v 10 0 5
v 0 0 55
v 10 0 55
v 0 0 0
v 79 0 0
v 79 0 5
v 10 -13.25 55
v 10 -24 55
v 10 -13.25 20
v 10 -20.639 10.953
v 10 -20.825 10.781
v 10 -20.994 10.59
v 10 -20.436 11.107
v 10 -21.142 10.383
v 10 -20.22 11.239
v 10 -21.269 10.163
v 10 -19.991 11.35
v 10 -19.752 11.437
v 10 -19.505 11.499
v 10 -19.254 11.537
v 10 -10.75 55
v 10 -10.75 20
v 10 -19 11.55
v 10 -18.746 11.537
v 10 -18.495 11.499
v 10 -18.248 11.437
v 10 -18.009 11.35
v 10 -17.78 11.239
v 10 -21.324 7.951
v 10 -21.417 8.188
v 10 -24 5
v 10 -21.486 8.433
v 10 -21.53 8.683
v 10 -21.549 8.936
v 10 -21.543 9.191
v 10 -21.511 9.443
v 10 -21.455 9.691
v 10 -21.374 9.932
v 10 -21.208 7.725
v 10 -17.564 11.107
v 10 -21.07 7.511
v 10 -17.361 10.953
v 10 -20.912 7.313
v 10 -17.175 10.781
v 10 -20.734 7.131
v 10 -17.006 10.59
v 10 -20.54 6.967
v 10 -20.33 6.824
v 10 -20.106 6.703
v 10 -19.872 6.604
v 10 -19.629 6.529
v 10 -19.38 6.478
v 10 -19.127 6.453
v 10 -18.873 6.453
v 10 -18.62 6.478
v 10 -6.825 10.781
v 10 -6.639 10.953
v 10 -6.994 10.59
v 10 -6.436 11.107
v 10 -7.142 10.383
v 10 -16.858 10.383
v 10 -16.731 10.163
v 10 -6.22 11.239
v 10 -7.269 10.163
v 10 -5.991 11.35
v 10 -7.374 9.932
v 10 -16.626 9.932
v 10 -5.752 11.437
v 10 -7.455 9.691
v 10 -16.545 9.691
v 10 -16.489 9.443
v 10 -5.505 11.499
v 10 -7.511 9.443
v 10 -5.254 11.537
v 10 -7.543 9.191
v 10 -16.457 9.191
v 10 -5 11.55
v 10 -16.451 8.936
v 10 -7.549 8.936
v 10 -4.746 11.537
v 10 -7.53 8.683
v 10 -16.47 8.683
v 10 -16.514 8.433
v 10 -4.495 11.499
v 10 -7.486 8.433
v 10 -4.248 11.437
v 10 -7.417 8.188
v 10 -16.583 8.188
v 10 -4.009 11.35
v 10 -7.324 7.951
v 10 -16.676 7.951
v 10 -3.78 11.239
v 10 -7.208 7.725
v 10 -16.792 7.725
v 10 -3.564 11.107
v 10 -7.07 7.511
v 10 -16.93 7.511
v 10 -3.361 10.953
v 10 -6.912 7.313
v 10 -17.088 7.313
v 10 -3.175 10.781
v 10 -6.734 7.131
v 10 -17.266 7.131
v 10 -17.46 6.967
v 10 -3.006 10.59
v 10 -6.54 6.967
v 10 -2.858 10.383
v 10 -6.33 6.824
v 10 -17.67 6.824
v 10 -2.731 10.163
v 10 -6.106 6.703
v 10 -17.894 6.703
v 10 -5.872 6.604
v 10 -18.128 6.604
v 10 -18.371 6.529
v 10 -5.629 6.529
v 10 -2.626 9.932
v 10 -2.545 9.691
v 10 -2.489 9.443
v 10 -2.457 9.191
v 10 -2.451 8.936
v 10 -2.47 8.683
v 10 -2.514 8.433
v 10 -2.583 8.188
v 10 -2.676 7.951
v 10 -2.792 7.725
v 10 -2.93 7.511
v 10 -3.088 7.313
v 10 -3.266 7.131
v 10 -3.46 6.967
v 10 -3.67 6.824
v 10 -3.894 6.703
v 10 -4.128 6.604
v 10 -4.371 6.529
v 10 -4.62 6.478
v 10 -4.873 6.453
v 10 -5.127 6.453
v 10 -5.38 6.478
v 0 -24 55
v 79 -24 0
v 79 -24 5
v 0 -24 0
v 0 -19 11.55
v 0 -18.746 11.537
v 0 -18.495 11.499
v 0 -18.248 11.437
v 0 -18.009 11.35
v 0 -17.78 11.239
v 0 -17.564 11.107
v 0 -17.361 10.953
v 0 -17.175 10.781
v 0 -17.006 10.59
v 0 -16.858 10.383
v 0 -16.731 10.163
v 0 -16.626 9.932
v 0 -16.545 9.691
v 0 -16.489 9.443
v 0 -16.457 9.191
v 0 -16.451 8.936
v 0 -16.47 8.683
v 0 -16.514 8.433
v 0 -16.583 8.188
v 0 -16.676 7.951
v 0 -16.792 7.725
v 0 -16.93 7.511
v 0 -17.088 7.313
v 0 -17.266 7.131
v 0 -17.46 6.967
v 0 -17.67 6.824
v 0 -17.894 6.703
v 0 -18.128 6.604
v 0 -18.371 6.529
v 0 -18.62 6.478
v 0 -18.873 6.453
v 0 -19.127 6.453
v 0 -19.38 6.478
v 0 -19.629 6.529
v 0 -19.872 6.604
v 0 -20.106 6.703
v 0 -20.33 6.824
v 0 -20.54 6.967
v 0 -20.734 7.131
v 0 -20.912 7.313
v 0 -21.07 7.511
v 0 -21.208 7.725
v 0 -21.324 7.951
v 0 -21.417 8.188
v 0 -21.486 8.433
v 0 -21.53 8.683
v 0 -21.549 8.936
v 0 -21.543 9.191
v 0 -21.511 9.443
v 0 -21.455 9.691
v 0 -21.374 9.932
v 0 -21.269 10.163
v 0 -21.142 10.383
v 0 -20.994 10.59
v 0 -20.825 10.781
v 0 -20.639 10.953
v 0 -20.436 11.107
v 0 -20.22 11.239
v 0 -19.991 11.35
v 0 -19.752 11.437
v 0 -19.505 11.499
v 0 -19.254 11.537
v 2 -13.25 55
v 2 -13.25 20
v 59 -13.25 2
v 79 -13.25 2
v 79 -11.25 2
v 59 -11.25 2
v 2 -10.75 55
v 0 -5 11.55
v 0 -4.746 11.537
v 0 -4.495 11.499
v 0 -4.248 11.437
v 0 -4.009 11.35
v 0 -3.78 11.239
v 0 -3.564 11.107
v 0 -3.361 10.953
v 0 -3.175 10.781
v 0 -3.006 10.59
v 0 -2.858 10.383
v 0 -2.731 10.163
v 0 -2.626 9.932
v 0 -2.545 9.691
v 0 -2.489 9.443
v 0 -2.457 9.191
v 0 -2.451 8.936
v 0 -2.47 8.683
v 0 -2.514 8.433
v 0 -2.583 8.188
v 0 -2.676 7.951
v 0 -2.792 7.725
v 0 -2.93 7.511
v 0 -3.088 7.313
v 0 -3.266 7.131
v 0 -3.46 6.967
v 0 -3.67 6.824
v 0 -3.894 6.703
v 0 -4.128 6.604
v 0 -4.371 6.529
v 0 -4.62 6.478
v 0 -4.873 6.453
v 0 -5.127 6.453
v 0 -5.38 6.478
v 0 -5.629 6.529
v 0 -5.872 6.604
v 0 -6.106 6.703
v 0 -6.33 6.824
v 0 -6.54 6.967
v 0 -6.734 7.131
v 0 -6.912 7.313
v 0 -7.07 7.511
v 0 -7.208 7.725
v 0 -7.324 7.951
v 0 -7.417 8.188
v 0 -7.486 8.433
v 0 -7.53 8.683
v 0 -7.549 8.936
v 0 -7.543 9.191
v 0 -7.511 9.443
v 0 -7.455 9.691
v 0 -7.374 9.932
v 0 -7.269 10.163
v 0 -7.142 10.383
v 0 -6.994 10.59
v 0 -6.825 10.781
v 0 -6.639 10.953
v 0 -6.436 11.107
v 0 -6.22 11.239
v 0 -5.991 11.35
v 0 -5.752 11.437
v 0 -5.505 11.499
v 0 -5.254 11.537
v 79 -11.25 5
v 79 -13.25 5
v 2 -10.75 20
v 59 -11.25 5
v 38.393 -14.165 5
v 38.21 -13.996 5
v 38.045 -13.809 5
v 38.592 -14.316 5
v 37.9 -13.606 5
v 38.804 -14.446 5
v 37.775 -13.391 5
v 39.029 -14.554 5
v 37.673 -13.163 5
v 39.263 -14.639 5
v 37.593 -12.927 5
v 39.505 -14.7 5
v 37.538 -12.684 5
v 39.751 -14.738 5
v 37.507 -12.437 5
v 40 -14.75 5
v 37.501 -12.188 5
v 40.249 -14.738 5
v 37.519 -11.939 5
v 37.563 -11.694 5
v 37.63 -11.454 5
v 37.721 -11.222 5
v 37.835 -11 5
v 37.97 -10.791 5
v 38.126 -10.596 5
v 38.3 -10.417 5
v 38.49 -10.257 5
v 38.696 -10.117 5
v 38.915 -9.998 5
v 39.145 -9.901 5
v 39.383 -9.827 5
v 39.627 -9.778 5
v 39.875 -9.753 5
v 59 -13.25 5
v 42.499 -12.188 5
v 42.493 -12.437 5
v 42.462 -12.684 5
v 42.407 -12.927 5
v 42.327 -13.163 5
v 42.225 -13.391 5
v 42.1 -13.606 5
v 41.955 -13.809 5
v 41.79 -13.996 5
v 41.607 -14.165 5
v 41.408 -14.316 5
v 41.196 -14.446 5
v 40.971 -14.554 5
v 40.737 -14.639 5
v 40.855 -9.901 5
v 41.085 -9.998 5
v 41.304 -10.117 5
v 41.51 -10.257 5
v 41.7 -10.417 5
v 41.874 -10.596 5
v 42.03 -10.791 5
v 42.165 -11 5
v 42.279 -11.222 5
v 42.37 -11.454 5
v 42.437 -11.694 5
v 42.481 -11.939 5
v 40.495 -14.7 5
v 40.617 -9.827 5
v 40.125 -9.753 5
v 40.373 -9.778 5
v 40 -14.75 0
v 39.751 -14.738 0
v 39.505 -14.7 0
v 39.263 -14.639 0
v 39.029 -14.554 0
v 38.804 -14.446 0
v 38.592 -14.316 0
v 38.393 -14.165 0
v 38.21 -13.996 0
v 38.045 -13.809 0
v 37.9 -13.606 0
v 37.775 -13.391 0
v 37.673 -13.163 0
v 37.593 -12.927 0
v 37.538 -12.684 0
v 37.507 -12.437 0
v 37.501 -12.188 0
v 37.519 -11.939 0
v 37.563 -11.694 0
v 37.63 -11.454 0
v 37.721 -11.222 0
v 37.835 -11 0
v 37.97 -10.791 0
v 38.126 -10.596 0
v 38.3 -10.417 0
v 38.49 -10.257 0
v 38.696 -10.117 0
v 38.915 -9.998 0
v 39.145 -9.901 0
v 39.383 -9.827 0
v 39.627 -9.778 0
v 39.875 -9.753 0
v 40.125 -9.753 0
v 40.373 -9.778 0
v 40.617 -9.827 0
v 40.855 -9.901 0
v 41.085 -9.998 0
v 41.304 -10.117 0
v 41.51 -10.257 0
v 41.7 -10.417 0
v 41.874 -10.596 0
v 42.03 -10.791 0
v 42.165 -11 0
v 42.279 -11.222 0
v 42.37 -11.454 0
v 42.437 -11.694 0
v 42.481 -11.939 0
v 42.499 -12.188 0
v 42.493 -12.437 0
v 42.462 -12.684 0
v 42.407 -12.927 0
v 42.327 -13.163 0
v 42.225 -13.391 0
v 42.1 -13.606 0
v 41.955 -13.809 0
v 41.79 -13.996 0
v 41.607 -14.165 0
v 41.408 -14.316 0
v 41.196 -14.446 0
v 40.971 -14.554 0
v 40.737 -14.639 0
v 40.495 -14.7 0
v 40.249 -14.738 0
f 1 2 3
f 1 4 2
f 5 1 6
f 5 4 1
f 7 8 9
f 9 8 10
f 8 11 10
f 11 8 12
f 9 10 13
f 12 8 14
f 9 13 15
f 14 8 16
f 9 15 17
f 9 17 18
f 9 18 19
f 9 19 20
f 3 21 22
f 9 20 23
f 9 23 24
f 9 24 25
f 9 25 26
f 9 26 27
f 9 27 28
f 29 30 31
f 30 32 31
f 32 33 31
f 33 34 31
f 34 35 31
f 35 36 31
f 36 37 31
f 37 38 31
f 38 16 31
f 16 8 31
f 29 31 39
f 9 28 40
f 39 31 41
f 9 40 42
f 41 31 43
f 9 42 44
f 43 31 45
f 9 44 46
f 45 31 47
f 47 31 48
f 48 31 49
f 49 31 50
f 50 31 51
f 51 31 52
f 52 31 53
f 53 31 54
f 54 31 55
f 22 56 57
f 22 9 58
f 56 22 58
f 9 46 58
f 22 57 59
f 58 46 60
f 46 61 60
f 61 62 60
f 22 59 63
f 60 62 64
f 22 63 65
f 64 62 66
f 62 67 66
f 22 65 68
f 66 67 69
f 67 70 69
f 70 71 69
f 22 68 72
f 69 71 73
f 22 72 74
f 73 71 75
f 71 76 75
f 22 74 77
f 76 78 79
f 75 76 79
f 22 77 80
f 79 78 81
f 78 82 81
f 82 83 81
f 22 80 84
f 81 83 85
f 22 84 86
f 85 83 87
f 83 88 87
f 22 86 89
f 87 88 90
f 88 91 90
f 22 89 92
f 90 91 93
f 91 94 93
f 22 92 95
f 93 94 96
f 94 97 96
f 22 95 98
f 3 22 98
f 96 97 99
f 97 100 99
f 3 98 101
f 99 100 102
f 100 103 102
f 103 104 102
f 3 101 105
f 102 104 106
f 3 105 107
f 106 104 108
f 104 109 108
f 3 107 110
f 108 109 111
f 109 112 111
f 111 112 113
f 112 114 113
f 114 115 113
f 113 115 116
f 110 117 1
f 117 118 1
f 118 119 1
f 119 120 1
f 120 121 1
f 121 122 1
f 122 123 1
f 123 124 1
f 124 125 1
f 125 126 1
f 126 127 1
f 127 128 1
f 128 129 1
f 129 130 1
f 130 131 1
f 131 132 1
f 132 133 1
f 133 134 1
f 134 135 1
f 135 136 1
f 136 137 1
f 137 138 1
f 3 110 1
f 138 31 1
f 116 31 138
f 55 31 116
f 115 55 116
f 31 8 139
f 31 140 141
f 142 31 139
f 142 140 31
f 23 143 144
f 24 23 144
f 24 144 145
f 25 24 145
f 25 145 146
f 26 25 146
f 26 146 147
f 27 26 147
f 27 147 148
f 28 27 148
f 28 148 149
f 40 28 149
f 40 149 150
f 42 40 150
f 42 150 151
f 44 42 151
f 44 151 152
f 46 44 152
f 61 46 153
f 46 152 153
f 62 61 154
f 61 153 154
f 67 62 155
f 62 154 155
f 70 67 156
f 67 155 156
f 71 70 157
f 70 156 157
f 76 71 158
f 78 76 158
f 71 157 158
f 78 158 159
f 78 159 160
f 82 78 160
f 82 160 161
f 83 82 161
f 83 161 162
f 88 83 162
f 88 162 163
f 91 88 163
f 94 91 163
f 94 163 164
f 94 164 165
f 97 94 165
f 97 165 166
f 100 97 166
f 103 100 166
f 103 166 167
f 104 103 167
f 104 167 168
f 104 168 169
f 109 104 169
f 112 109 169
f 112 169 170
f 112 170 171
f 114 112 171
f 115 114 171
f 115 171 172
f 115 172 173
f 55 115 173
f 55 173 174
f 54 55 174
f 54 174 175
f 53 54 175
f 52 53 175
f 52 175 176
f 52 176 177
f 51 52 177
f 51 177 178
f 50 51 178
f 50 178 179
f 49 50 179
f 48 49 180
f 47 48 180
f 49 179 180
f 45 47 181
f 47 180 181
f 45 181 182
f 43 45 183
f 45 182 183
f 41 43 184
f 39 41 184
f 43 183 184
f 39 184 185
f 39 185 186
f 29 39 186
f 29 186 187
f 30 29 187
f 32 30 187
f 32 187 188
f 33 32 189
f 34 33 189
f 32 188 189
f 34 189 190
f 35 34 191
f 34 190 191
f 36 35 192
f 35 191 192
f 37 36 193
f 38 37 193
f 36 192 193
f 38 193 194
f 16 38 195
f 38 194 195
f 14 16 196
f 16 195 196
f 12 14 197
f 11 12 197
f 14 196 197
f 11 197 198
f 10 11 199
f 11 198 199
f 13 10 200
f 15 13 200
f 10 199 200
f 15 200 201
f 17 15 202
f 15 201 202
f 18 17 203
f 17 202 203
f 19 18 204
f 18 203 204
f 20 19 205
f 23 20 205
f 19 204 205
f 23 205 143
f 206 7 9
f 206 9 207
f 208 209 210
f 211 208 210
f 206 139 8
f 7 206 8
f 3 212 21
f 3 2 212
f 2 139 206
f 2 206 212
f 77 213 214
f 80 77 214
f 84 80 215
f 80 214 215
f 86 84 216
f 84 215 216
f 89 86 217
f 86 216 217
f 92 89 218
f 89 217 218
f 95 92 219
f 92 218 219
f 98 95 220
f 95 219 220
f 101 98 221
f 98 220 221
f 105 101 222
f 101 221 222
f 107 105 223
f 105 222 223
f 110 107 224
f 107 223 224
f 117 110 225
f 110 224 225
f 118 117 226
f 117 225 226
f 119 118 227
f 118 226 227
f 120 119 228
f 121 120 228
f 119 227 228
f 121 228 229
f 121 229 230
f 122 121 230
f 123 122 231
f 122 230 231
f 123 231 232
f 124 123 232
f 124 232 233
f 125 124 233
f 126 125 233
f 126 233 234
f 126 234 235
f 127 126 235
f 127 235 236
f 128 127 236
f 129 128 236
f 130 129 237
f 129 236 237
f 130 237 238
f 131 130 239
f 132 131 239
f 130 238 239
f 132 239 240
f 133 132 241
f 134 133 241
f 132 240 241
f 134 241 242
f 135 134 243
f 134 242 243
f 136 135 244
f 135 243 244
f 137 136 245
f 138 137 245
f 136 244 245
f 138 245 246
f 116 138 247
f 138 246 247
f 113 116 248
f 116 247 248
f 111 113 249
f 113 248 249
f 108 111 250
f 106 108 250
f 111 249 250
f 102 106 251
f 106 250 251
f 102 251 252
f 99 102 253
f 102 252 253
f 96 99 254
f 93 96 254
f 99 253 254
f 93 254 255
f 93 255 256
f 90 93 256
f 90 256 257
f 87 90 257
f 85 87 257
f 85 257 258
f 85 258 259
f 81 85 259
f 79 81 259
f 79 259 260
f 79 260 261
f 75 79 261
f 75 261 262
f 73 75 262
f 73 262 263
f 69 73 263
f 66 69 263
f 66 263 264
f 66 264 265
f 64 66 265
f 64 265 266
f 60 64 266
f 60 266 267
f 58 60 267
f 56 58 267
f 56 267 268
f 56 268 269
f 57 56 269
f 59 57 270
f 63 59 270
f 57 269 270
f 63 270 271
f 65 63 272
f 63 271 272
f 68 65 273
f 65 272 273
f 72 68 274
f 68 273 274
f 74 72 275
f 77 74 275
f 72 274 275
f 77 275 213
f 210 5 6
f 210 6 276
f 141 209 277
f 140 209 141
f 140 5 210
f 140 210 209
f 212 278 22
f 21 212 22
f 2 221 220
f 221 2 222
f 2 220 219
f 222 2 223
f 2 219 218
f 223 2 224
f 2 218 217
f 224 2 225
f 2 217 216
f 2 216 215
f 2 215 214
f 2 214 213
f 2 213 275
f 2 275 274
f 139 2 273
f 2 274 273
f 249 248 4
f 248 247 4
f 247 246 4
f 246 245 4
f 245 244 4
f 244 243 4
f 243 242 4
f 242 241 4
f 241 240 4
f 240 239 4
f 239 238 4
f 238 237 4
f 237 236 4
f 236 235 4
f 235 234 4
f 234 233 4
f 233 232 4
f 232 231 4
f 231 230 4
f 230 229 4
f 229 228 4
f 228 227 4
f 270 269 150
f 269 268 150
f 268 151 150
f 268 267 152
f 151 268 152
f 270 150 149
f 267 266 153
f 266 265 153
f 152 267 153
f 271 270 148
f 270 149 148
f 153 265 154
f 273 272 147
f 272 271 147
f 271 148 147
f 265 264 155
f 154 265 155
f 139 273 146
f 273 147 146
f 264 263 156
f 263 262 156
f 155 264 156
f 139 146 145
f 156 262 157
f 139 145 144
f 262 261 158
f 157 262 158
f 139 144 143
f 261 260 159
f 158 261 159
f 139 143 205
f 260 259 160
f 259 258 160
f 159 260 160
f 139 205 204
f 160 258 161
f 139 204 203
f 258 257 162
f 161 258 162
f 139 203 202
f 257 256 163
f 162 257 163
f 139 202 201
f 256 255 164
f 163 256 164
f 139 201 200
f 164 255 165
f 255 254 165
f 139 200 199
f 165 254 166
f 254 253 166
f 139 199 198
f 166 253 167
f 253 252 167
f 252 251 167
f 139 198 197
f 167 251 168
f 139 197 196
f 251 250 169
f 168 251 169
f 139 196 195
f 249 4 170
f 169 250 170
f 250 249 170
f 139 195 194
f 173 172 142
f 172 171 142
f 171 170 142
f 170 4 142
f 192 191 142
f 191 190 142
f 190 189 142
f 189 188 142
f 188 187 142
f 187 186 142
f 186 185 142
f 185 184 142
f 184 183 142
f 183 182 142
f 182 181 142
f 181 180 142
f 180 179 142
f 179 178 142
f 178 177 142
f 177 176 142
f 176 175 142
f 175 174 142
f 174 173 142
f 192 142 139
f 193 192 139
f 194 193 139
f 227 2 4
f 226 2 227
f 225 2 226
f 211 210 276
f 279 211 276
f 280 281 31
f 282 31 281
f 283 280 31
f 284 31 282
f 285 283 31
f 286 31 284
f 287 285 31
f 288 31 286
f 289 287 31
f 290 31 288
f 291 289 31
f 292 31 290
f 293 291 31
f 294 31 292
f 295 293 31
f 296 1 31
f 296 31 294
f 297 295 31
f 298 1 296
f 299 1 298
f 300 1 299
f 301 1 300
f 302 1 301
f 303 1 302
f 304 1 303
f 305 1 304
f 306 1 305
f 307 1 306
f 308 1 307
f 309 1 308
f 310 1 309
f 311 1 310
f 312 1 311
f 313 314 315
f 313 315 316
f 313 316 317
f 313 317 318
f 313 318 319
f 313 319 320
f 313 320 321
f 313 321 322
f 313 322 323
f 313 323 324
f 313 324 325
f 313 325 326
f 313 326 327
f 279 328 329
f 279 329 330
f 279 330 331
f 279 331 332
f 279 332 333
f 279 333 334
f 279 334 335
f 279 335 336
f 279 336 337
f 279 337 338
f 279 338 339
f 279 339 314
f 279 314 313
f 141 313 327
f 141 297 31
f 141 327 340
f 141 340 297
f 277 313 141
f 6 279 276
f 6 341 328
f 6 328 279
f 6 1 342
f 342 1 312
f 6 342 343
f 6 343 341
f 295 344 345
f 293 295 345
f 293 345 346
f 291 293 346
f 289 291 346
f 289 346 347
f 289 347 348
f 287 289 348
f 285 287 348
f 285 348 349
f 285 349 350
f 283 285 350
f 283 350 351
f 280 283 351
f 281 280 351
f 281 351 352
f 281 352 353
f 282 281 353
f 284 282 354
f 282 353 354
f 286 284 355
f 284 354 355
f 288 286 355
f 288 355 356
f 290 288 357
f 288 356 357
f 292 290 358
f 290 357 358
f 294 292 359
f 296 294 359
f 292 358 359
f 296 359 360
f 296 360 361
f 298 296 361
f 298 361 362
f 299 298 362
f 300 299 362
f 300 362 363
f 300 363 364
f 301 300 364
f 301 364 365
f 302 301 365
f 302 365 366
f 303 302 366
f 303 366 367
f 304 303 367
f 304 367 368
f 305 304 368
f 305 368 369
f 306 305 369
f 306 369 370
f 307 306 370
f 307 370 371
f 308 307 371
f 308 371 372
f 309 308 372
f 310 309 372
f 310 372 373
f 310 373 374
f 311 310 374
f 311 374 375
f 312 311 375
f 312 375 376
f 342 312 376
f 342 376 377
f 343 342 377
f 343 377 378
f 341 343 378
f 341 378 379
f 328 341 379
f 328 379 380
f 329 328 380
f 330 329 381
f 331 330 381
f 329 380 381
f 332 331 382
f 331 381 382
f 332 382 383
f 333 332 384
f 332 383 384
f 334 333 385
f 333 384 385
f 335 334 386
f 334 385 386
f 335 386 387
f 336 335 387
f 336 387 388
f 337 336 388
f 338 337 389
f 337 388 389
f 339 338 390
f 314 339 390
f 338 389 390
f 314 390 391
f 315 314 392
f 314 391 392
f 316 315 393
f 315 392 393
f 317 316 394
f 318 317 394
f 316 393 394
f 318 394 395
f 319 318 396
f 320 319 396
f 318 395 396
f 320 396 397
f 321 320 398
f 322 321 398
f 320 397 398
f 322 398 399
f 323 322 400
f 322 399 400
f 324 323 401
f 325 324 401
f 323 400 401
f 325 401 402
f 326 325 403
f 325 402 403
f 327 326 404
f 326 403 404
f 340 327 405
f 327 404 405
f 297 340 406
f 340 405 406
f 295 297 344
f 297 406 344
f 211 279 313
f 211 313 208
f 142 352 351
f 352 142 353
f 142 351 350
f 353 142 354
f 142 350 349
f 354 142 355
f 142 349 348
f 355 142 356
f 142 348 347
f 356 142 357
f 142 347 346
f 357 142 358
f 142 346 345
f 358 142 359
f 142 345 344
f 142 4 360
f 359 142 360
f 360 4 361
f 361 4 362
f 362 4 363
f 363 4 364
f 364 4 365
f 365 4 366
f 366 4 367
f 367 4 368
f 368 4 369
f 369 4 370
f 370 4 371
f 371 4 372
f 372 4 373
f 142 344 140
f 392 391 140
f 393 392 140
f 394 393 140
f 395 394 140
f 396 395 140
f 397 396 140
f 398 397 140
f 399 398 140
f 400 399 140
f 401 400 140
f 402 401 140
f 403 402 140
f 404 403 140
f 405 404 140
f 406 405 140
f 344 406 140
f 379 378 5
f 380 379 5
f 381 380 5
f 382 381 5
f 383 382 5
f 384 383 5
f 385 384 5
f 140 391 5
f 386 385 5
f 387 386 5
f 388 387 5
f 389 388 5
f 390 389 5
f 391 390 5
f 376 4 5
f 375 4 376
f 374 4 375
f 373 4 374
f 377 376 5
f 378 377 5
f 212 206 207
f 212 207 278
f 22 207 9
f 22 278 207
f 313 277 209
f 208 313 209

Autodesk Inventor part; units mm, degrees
sketch "Skizze1" plane through (0, 0, 0) normal (0, 0, 1) x (1, 0, 0)
  line L0 (-15.8, 0) -> (94.8, 0) projected
  line L1 (0, -28.8) -> (0, 4.8) projected
  line L2 (0, 0) -> (79, 0)
  line L3 (79, 0) -> (79, -24)
  line L4 (79, -24) -> (0, -24)
  line L5 (0, -24) -> (0, 0)
  dimension "d0" = 79
  dimension "d1" = 24
extrude "Extrusion1" add sketch "Skizze1" along normal blind 5
sketch "Skizze2" plane through (0, 0, 5) normal (0, 0, 1) x (1, 0, 0)
  line L0 (0, -24) -> (79, -24) projected
  line L1 (0, 0) -> (10, 0)
  line L2 (10, 0) -> (10, -24)
  line L3 (10, -24) -> (0, -24)
  line L4 (0, -24) -> (0, 0)
  dimension "d4" = 10
extrude "Extrusion2" add sketch "Skizze2" along normal blind 35
sketch "Skizze3" plane through (79, -24, 0) normal (1, 0, 0) x (0, 0, -1)
  line L0 (-5, 0) -> (-5, 24) projected
  line L1 (-5, 10.75) -> (-2, 10.75)
  line L2 (-2, 10.75) -> (-2, 12.75)
  line L3 (-2, 12.75) -> (-5, 12.75)
  line L4 (-5, 12.75) -> (-5, 10.75)
  line L5 (0, 24) -> (-5, 24) projected
  dimension "d7" = 3
  dimension "d8" = 2
  dimension "d9" = 11.25
extrude "Extrusion3" cut sketch "Skizze3" against normal blind 20
hole "Bohrung1" at (40, -12.25, 5) direction (0, 0, -1) diameter 5 end through all
sketch "Skizze5" plane through (0, -24, 0) normal (-1, 0, 0) x (0, 0, 1)
  line L0 (5, 24) -> (40, 24) projected
  line L1 (9, 24) -> (9, -0.204)
  line L2 (0, 0) -> (0, 24) projected
  circle A0 centre (9, 19) radius 2.55
  circle A1 centre (9, 5) radius 2.55
  line L3 (0, 0) -> (40, 0) projected
  dimension "d26" = 9
  dimension "d27" = 5.1
  dimension "d28" = 5.1
  dimension "d29" = 5
  dimension "d30" = 5
extrude "Extrusion5" cut sketch "Skizze5" against normal blind 30
sketch "Skizze6" plane through (0, 0, 40) normal (0, 0, 1) x (1, 0, 0)
  line L0 (79, -24) -> (0, -24) projected
  line L1 (0, 0) -> (0, -24)
  line L2 (0, -24) -> (10, -24)
  line L3 (10, -24) -> (10, -13.4534)
  line L4 (10, 0) -> (10, -24) projected
  line L5 (10, -13.25) -> (2, -13.25) projected
  line L6 (2, -11.25) -> (10, -11.25) projected
  line L7 (2, -13.25) -> (2, -11.25)
  line L8 (2, -11.25) -> (10, -11.25)
  line L9 (10, -11.25) -> (10, 0)
  line L10 (0, 0) -> (79, 0) projected
  line L11 (0, -24) -> (0, 0) projected
  line L12 (0, 0) -> (0, -24)
  dimension "d33" = 10
sketch "Skizze7" plane through (0, 0, 40) normal (0, 0, 1) x (1, 0, 0)
  line L0 (10, -13.25) -> (2, -13.25) projected
  line L1 (2, -13.25) -> (10, -13.25)
  point P0 (0, 0)
extrude "Extrusion6" add sketch "Skizze6" along normal blind 15 contours L0 L1 L10 L4 L6 L7 L5 L3
sketch "Skizze8" plane through (0, 0, 55) normal (0, 0, 1) x (1, 0, 0)
  line L0 (10, -11.25) -> (2, -11.25) projected
  line L1 (2, -13.25) -> (10, -13.25) projected
  line L2 (2, -11.25) -> (2, -13.25)
  line L3 (2, -13.25) -> (10, -13.25)
  line L4 (10, -13.25) -> (10, -11.25)
  line L5 (10, 0) -> (10, -24) projected
  line L6 (2, -11.25) -> (10, -11.25)
  point P0 (0, 0)
extrude "Extrusion7" add sketch "Skizze8" against normal blind 35
sketch "Skizze9" plane through (0, 0, 0) normal (0, 1, 0) x (-1, 0, 0)
  point P0 (0, 0)
sketch "Skizze10" plane through (0, 0, 55) normal (0, 0, 1) x (1, 0, 0)
  line L0 (10, 0) -> (10, -24) projected
  line L1 (10, -13.25) -> (2, -13.25)
  line L2 (2, -13.25) -> (2, -10.75)
  line L3 (2, -10.75) -> (10, -10.75)
  line L4 (10, -10.75) -> (10, -13.25)
  line L5 (10, 0) -> (0, 0) projected
  line L6 (0, -24) -> (10, -24) projected
  dimension "d38" = 8
  dimension "d39" = 10.75
  dimension "d40" = 10.75
extrude "Extrusion8" cut sketch "Skizze10" against normal blind 35
properties part number "Gundaufbau"
